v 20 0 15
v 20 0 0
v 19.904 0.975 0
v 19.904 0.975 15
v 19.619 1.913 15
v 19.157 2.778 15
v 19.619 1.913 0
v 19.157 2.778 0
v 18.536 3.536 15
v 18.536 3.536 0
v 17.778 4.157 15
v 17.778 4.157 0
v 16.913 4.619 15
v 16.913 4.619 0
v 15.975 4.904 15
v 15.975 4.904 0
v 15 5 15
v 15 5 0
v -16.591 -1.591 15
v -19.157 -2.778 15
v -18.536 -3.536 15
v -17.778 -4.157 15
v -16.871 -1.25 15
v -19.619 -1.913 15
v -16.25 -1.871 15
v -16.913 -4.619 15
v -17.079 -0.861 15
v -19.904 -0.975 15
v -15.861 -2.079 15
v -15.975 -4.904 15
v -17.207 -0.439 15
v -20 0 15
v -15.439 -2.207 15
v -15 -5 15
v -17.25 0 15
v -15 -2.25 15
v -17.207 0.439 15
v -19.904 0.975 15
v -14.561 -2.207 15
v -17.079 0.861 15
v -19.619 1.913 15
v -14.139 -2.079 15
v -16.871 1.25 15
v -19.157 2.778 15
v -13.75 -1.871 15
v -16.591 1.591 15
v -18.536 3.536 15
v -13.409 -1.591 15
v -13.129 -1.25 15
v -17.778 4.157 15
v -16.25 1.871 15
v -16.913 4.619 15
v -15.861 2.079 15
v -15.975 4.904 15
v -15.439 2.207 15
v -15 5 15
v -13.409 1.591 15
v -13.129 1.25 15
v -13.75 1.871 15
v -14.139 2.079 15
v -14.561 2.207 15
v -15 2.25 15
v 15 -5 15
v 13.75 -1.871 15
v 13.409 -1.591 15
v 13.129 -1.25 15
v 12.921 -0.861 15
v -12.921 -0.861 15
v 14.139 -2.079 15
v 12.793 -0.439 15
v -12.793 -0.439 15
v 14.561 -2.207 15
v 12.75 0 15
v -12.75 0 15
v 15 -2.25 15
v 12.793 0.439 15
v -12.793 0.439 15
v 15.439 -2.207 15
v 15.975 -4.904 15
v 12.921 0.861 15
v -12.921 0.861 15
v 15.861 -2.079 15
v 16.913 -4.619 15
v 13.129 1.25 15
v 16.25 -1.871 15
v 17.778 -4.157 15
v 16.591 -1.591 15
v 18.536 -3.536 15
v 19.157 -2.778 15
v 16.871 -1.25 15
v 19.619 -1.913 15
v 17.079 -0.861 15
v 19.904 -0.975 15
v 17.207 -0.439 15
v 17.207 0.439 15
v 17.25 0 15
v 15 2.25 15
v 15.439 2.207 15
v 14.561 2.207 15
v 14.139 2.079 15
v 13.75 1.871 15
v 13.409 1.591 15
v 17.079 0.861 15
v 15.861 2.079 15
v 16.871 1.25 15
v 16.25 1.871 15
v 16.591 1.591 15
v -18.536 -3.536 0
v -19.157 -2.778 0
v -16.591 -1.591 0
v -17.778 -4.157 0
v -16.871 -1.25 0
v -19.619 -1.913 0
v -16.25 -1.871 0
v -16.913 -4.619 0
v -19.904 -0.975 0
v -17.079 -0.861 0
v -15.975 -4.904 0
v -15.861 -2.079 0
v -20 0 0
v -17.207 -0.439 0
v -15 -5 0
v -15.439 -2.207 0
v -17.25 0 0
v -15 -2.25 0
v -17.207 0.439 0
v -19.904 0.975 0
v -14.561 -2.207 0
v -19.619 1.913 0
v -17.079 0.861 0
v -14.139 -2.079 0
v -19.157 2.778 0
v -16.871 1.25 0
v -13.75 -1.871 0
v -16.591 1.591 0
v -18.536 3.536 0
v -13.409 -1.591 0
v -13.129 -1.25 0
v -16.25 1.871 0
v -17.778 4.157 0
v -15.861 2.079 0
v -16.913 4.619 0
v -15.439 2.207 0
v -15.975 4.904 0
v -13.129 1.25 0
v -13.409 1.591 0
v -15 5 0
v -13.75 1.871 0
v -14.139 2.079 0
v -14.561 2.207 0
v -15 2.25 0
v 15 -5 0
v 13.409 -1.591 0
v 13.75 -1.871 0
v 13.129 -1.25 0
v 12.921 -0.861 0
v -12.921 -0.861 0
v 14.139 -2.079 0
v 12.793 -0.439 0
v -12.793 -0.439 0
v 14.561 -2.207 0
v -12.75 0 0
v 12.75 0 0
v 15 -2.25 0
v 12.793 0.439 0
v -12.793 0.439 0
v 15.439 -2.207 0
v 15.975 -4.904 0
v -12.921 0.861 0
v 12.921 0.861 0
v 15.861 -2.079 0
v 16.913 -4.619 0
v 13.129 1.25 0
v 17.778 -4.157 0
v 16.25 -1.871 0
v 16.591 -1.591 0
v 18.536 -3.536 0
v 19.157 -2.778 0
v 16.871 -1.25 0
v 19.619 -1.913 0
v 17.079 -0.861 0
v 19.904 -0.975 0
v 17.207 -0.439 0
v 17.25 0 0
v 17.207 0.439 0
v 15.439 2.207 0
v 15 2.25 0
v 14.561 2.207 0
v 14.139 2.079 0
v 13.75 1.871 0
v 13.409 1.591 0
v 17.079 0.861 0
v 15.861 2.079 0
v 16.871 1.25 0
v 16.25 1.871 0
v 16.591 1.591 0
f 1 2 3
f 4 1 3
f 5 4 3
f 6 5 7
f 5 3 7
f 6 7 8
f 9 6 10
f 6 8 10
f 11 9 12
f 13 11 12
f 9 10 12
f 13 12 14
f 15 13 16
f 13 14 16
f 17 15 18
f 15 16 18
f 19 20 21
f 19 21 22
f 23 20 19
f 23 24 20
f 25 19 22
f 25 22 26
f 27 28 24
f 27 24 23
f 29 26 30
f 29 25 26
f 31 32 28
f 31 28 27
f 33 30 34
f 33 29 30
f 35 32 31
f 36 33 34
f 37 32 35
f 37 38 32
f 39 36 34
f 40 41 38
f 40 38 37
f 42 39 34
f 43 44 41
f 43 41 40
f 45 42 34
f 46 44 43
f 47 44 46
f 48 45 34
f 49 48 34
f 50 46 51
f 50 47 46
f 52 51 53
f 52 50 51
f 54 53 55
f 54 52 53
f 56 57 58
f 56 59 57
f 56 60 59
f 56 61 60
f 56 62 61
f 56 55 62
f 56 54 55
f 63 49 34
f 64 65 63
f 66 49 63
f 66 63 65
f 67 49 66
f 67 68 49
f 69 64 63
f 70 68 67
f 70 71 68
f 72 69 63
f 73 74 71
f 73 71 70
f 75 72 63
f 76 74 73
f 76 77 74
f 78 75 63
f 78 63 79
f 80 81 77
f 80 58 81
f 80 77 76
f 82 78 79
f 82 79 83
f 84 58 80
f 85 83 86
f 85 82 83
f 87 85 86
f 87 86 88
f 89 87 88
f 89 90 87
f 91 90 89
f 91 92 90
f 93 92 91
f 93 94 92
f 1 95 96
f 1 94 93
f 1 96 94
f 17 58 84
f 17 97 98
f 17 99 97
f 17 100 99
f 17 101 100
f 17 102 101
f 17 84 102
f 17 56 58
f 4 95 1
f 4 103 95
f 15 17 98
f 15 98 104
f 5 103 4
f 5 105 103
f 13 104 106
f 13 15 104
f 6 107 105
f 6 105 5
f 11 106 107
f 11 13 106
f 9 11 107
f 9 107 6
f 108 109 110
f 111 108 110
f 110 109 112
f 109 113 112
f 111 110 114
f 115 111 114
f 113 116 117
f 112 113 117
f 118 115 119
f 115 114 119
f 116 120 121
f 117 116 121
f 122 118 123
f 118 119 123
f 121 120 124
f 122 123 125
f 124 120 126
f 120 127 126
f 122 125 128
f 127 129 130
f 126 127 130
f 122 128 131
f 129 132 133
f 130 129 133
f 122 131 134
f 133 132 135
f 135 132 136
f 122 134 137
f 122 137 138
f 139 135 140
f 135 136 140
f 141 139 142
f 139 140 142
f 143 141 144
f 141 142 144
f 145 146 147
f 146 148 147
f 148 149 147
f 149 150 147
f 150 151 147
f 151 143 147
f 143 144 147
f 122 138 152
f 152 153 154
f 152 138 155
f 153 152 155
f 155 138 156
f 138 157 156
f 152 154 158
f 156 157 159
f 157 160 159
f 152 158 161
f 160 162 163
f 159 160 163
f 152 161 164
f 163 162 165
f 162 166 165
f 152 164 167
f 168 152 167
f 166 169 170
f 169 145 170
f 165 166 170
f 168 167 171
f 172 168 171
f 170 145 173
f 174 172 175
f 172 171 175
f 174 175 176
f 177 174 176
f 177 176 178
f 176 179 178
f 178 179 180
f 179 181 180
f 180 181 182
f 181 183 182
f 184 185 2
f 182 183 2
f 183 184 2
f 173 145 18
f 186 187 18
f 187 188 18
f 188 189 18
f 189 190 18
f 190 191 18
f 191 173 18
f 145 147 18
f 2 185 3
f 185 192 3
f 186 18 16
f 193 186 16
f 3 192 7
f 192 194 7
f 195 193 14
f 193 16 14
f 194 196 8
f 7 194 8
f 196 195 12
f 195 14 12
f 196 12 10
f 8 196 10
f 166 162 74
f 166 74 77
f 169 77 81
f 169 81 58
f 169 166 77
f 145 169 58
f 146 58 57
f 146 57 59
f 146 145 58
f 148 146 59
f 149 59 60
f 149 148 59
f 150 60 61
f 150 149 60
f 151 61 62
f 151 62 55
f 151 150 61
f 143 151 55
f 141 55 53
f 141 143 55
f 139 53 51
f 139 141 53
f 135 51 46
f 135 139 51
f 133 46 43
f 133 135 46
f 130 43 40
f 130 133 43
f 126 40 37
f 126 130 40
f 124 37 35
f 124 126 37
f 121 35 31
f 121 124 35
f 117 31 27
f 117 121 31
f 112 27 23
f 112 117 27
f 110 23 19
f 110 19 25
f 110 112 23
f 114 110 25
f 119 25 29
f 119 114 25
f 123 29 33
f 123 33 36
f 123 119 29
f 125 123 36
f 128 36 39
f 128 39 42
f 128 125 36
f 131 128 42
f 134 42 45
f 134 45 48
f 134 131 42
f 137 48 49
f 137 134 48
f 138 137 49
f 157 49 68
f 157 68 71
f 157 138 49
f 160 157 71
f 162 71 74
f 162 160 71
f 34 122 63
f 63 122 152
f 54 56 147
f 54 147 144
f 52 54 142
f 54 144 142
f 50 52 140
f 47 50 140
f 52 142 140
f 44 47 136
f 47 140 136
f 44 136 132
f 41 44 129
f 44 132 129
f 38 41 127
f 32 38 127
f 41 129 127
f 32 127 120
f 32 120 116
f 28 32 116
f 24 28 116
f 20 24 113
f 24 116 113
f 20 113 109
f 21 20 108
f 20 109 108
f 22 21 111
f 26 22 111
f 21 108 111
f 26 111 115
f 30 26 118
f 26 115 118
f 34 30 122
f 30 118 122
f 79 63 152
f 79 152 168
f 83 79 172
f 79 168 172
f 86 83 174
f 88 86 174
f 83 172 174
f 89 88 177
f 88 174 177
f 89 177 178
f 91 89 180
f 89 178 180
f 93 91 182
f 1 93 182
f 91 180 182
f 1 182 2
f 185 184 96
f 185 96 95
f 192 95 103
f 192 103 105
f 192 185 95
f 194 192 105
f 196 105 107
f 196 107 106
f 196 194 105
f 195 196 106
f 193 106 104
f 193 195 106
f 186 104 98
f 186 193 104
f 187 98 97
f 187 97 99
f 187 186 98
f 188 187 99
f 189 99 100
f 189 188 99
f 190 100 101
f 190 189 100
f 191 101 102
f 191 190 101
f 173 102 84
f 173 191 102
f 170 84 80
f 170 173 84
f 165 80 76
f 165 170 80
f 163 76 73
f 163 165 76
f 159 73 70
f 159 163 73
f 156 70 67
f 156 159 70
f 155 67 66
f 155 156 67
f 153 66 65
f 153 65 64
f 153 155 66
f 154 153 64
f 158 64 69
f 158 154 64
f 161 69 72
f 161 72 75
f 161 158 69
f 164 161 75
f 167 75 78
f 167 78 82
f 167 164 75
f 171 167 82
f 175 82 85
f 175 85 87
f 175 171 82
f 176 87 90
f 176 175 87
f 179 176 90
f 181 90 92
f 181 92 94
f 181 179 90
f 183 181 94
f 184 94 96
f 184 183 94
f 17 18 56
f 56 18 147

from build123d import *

# Parameters (mm, degrees)
F0_R     = 2.25
F1_DEPTH = 15


with BuildPart() as f1:
    # F0 (on Top) → F1 (new body)
    with BuildSketch(Plane.XY):
        with BuildLine():
            ThreePointArc((20, 0), (18.535534, 3.535534), (15, 5))
            Line((15, 5), (-15, 5))
            ThreePointArc((-15, 5), (-18.535534, 3.535534), (-20, 0))
            ThreePointArc((-20, 0), (-18.535534, -3.535534), (-15, -5))
            Line((-15, -5), (15, -5))
            ThreePointArc((15, -5), (18.535534, -3.535534), (20, 0))
        make_face()
        with Locations((-15, 0)):
            Circle(F0_R, mode=Mode.SUBTRACT)
        with Locations((15, 0)):
            Circle(F0_R, mode=Mode.SUBTRACT)
    extrude(amount=F1_DEPTH)


solid = f1.part
